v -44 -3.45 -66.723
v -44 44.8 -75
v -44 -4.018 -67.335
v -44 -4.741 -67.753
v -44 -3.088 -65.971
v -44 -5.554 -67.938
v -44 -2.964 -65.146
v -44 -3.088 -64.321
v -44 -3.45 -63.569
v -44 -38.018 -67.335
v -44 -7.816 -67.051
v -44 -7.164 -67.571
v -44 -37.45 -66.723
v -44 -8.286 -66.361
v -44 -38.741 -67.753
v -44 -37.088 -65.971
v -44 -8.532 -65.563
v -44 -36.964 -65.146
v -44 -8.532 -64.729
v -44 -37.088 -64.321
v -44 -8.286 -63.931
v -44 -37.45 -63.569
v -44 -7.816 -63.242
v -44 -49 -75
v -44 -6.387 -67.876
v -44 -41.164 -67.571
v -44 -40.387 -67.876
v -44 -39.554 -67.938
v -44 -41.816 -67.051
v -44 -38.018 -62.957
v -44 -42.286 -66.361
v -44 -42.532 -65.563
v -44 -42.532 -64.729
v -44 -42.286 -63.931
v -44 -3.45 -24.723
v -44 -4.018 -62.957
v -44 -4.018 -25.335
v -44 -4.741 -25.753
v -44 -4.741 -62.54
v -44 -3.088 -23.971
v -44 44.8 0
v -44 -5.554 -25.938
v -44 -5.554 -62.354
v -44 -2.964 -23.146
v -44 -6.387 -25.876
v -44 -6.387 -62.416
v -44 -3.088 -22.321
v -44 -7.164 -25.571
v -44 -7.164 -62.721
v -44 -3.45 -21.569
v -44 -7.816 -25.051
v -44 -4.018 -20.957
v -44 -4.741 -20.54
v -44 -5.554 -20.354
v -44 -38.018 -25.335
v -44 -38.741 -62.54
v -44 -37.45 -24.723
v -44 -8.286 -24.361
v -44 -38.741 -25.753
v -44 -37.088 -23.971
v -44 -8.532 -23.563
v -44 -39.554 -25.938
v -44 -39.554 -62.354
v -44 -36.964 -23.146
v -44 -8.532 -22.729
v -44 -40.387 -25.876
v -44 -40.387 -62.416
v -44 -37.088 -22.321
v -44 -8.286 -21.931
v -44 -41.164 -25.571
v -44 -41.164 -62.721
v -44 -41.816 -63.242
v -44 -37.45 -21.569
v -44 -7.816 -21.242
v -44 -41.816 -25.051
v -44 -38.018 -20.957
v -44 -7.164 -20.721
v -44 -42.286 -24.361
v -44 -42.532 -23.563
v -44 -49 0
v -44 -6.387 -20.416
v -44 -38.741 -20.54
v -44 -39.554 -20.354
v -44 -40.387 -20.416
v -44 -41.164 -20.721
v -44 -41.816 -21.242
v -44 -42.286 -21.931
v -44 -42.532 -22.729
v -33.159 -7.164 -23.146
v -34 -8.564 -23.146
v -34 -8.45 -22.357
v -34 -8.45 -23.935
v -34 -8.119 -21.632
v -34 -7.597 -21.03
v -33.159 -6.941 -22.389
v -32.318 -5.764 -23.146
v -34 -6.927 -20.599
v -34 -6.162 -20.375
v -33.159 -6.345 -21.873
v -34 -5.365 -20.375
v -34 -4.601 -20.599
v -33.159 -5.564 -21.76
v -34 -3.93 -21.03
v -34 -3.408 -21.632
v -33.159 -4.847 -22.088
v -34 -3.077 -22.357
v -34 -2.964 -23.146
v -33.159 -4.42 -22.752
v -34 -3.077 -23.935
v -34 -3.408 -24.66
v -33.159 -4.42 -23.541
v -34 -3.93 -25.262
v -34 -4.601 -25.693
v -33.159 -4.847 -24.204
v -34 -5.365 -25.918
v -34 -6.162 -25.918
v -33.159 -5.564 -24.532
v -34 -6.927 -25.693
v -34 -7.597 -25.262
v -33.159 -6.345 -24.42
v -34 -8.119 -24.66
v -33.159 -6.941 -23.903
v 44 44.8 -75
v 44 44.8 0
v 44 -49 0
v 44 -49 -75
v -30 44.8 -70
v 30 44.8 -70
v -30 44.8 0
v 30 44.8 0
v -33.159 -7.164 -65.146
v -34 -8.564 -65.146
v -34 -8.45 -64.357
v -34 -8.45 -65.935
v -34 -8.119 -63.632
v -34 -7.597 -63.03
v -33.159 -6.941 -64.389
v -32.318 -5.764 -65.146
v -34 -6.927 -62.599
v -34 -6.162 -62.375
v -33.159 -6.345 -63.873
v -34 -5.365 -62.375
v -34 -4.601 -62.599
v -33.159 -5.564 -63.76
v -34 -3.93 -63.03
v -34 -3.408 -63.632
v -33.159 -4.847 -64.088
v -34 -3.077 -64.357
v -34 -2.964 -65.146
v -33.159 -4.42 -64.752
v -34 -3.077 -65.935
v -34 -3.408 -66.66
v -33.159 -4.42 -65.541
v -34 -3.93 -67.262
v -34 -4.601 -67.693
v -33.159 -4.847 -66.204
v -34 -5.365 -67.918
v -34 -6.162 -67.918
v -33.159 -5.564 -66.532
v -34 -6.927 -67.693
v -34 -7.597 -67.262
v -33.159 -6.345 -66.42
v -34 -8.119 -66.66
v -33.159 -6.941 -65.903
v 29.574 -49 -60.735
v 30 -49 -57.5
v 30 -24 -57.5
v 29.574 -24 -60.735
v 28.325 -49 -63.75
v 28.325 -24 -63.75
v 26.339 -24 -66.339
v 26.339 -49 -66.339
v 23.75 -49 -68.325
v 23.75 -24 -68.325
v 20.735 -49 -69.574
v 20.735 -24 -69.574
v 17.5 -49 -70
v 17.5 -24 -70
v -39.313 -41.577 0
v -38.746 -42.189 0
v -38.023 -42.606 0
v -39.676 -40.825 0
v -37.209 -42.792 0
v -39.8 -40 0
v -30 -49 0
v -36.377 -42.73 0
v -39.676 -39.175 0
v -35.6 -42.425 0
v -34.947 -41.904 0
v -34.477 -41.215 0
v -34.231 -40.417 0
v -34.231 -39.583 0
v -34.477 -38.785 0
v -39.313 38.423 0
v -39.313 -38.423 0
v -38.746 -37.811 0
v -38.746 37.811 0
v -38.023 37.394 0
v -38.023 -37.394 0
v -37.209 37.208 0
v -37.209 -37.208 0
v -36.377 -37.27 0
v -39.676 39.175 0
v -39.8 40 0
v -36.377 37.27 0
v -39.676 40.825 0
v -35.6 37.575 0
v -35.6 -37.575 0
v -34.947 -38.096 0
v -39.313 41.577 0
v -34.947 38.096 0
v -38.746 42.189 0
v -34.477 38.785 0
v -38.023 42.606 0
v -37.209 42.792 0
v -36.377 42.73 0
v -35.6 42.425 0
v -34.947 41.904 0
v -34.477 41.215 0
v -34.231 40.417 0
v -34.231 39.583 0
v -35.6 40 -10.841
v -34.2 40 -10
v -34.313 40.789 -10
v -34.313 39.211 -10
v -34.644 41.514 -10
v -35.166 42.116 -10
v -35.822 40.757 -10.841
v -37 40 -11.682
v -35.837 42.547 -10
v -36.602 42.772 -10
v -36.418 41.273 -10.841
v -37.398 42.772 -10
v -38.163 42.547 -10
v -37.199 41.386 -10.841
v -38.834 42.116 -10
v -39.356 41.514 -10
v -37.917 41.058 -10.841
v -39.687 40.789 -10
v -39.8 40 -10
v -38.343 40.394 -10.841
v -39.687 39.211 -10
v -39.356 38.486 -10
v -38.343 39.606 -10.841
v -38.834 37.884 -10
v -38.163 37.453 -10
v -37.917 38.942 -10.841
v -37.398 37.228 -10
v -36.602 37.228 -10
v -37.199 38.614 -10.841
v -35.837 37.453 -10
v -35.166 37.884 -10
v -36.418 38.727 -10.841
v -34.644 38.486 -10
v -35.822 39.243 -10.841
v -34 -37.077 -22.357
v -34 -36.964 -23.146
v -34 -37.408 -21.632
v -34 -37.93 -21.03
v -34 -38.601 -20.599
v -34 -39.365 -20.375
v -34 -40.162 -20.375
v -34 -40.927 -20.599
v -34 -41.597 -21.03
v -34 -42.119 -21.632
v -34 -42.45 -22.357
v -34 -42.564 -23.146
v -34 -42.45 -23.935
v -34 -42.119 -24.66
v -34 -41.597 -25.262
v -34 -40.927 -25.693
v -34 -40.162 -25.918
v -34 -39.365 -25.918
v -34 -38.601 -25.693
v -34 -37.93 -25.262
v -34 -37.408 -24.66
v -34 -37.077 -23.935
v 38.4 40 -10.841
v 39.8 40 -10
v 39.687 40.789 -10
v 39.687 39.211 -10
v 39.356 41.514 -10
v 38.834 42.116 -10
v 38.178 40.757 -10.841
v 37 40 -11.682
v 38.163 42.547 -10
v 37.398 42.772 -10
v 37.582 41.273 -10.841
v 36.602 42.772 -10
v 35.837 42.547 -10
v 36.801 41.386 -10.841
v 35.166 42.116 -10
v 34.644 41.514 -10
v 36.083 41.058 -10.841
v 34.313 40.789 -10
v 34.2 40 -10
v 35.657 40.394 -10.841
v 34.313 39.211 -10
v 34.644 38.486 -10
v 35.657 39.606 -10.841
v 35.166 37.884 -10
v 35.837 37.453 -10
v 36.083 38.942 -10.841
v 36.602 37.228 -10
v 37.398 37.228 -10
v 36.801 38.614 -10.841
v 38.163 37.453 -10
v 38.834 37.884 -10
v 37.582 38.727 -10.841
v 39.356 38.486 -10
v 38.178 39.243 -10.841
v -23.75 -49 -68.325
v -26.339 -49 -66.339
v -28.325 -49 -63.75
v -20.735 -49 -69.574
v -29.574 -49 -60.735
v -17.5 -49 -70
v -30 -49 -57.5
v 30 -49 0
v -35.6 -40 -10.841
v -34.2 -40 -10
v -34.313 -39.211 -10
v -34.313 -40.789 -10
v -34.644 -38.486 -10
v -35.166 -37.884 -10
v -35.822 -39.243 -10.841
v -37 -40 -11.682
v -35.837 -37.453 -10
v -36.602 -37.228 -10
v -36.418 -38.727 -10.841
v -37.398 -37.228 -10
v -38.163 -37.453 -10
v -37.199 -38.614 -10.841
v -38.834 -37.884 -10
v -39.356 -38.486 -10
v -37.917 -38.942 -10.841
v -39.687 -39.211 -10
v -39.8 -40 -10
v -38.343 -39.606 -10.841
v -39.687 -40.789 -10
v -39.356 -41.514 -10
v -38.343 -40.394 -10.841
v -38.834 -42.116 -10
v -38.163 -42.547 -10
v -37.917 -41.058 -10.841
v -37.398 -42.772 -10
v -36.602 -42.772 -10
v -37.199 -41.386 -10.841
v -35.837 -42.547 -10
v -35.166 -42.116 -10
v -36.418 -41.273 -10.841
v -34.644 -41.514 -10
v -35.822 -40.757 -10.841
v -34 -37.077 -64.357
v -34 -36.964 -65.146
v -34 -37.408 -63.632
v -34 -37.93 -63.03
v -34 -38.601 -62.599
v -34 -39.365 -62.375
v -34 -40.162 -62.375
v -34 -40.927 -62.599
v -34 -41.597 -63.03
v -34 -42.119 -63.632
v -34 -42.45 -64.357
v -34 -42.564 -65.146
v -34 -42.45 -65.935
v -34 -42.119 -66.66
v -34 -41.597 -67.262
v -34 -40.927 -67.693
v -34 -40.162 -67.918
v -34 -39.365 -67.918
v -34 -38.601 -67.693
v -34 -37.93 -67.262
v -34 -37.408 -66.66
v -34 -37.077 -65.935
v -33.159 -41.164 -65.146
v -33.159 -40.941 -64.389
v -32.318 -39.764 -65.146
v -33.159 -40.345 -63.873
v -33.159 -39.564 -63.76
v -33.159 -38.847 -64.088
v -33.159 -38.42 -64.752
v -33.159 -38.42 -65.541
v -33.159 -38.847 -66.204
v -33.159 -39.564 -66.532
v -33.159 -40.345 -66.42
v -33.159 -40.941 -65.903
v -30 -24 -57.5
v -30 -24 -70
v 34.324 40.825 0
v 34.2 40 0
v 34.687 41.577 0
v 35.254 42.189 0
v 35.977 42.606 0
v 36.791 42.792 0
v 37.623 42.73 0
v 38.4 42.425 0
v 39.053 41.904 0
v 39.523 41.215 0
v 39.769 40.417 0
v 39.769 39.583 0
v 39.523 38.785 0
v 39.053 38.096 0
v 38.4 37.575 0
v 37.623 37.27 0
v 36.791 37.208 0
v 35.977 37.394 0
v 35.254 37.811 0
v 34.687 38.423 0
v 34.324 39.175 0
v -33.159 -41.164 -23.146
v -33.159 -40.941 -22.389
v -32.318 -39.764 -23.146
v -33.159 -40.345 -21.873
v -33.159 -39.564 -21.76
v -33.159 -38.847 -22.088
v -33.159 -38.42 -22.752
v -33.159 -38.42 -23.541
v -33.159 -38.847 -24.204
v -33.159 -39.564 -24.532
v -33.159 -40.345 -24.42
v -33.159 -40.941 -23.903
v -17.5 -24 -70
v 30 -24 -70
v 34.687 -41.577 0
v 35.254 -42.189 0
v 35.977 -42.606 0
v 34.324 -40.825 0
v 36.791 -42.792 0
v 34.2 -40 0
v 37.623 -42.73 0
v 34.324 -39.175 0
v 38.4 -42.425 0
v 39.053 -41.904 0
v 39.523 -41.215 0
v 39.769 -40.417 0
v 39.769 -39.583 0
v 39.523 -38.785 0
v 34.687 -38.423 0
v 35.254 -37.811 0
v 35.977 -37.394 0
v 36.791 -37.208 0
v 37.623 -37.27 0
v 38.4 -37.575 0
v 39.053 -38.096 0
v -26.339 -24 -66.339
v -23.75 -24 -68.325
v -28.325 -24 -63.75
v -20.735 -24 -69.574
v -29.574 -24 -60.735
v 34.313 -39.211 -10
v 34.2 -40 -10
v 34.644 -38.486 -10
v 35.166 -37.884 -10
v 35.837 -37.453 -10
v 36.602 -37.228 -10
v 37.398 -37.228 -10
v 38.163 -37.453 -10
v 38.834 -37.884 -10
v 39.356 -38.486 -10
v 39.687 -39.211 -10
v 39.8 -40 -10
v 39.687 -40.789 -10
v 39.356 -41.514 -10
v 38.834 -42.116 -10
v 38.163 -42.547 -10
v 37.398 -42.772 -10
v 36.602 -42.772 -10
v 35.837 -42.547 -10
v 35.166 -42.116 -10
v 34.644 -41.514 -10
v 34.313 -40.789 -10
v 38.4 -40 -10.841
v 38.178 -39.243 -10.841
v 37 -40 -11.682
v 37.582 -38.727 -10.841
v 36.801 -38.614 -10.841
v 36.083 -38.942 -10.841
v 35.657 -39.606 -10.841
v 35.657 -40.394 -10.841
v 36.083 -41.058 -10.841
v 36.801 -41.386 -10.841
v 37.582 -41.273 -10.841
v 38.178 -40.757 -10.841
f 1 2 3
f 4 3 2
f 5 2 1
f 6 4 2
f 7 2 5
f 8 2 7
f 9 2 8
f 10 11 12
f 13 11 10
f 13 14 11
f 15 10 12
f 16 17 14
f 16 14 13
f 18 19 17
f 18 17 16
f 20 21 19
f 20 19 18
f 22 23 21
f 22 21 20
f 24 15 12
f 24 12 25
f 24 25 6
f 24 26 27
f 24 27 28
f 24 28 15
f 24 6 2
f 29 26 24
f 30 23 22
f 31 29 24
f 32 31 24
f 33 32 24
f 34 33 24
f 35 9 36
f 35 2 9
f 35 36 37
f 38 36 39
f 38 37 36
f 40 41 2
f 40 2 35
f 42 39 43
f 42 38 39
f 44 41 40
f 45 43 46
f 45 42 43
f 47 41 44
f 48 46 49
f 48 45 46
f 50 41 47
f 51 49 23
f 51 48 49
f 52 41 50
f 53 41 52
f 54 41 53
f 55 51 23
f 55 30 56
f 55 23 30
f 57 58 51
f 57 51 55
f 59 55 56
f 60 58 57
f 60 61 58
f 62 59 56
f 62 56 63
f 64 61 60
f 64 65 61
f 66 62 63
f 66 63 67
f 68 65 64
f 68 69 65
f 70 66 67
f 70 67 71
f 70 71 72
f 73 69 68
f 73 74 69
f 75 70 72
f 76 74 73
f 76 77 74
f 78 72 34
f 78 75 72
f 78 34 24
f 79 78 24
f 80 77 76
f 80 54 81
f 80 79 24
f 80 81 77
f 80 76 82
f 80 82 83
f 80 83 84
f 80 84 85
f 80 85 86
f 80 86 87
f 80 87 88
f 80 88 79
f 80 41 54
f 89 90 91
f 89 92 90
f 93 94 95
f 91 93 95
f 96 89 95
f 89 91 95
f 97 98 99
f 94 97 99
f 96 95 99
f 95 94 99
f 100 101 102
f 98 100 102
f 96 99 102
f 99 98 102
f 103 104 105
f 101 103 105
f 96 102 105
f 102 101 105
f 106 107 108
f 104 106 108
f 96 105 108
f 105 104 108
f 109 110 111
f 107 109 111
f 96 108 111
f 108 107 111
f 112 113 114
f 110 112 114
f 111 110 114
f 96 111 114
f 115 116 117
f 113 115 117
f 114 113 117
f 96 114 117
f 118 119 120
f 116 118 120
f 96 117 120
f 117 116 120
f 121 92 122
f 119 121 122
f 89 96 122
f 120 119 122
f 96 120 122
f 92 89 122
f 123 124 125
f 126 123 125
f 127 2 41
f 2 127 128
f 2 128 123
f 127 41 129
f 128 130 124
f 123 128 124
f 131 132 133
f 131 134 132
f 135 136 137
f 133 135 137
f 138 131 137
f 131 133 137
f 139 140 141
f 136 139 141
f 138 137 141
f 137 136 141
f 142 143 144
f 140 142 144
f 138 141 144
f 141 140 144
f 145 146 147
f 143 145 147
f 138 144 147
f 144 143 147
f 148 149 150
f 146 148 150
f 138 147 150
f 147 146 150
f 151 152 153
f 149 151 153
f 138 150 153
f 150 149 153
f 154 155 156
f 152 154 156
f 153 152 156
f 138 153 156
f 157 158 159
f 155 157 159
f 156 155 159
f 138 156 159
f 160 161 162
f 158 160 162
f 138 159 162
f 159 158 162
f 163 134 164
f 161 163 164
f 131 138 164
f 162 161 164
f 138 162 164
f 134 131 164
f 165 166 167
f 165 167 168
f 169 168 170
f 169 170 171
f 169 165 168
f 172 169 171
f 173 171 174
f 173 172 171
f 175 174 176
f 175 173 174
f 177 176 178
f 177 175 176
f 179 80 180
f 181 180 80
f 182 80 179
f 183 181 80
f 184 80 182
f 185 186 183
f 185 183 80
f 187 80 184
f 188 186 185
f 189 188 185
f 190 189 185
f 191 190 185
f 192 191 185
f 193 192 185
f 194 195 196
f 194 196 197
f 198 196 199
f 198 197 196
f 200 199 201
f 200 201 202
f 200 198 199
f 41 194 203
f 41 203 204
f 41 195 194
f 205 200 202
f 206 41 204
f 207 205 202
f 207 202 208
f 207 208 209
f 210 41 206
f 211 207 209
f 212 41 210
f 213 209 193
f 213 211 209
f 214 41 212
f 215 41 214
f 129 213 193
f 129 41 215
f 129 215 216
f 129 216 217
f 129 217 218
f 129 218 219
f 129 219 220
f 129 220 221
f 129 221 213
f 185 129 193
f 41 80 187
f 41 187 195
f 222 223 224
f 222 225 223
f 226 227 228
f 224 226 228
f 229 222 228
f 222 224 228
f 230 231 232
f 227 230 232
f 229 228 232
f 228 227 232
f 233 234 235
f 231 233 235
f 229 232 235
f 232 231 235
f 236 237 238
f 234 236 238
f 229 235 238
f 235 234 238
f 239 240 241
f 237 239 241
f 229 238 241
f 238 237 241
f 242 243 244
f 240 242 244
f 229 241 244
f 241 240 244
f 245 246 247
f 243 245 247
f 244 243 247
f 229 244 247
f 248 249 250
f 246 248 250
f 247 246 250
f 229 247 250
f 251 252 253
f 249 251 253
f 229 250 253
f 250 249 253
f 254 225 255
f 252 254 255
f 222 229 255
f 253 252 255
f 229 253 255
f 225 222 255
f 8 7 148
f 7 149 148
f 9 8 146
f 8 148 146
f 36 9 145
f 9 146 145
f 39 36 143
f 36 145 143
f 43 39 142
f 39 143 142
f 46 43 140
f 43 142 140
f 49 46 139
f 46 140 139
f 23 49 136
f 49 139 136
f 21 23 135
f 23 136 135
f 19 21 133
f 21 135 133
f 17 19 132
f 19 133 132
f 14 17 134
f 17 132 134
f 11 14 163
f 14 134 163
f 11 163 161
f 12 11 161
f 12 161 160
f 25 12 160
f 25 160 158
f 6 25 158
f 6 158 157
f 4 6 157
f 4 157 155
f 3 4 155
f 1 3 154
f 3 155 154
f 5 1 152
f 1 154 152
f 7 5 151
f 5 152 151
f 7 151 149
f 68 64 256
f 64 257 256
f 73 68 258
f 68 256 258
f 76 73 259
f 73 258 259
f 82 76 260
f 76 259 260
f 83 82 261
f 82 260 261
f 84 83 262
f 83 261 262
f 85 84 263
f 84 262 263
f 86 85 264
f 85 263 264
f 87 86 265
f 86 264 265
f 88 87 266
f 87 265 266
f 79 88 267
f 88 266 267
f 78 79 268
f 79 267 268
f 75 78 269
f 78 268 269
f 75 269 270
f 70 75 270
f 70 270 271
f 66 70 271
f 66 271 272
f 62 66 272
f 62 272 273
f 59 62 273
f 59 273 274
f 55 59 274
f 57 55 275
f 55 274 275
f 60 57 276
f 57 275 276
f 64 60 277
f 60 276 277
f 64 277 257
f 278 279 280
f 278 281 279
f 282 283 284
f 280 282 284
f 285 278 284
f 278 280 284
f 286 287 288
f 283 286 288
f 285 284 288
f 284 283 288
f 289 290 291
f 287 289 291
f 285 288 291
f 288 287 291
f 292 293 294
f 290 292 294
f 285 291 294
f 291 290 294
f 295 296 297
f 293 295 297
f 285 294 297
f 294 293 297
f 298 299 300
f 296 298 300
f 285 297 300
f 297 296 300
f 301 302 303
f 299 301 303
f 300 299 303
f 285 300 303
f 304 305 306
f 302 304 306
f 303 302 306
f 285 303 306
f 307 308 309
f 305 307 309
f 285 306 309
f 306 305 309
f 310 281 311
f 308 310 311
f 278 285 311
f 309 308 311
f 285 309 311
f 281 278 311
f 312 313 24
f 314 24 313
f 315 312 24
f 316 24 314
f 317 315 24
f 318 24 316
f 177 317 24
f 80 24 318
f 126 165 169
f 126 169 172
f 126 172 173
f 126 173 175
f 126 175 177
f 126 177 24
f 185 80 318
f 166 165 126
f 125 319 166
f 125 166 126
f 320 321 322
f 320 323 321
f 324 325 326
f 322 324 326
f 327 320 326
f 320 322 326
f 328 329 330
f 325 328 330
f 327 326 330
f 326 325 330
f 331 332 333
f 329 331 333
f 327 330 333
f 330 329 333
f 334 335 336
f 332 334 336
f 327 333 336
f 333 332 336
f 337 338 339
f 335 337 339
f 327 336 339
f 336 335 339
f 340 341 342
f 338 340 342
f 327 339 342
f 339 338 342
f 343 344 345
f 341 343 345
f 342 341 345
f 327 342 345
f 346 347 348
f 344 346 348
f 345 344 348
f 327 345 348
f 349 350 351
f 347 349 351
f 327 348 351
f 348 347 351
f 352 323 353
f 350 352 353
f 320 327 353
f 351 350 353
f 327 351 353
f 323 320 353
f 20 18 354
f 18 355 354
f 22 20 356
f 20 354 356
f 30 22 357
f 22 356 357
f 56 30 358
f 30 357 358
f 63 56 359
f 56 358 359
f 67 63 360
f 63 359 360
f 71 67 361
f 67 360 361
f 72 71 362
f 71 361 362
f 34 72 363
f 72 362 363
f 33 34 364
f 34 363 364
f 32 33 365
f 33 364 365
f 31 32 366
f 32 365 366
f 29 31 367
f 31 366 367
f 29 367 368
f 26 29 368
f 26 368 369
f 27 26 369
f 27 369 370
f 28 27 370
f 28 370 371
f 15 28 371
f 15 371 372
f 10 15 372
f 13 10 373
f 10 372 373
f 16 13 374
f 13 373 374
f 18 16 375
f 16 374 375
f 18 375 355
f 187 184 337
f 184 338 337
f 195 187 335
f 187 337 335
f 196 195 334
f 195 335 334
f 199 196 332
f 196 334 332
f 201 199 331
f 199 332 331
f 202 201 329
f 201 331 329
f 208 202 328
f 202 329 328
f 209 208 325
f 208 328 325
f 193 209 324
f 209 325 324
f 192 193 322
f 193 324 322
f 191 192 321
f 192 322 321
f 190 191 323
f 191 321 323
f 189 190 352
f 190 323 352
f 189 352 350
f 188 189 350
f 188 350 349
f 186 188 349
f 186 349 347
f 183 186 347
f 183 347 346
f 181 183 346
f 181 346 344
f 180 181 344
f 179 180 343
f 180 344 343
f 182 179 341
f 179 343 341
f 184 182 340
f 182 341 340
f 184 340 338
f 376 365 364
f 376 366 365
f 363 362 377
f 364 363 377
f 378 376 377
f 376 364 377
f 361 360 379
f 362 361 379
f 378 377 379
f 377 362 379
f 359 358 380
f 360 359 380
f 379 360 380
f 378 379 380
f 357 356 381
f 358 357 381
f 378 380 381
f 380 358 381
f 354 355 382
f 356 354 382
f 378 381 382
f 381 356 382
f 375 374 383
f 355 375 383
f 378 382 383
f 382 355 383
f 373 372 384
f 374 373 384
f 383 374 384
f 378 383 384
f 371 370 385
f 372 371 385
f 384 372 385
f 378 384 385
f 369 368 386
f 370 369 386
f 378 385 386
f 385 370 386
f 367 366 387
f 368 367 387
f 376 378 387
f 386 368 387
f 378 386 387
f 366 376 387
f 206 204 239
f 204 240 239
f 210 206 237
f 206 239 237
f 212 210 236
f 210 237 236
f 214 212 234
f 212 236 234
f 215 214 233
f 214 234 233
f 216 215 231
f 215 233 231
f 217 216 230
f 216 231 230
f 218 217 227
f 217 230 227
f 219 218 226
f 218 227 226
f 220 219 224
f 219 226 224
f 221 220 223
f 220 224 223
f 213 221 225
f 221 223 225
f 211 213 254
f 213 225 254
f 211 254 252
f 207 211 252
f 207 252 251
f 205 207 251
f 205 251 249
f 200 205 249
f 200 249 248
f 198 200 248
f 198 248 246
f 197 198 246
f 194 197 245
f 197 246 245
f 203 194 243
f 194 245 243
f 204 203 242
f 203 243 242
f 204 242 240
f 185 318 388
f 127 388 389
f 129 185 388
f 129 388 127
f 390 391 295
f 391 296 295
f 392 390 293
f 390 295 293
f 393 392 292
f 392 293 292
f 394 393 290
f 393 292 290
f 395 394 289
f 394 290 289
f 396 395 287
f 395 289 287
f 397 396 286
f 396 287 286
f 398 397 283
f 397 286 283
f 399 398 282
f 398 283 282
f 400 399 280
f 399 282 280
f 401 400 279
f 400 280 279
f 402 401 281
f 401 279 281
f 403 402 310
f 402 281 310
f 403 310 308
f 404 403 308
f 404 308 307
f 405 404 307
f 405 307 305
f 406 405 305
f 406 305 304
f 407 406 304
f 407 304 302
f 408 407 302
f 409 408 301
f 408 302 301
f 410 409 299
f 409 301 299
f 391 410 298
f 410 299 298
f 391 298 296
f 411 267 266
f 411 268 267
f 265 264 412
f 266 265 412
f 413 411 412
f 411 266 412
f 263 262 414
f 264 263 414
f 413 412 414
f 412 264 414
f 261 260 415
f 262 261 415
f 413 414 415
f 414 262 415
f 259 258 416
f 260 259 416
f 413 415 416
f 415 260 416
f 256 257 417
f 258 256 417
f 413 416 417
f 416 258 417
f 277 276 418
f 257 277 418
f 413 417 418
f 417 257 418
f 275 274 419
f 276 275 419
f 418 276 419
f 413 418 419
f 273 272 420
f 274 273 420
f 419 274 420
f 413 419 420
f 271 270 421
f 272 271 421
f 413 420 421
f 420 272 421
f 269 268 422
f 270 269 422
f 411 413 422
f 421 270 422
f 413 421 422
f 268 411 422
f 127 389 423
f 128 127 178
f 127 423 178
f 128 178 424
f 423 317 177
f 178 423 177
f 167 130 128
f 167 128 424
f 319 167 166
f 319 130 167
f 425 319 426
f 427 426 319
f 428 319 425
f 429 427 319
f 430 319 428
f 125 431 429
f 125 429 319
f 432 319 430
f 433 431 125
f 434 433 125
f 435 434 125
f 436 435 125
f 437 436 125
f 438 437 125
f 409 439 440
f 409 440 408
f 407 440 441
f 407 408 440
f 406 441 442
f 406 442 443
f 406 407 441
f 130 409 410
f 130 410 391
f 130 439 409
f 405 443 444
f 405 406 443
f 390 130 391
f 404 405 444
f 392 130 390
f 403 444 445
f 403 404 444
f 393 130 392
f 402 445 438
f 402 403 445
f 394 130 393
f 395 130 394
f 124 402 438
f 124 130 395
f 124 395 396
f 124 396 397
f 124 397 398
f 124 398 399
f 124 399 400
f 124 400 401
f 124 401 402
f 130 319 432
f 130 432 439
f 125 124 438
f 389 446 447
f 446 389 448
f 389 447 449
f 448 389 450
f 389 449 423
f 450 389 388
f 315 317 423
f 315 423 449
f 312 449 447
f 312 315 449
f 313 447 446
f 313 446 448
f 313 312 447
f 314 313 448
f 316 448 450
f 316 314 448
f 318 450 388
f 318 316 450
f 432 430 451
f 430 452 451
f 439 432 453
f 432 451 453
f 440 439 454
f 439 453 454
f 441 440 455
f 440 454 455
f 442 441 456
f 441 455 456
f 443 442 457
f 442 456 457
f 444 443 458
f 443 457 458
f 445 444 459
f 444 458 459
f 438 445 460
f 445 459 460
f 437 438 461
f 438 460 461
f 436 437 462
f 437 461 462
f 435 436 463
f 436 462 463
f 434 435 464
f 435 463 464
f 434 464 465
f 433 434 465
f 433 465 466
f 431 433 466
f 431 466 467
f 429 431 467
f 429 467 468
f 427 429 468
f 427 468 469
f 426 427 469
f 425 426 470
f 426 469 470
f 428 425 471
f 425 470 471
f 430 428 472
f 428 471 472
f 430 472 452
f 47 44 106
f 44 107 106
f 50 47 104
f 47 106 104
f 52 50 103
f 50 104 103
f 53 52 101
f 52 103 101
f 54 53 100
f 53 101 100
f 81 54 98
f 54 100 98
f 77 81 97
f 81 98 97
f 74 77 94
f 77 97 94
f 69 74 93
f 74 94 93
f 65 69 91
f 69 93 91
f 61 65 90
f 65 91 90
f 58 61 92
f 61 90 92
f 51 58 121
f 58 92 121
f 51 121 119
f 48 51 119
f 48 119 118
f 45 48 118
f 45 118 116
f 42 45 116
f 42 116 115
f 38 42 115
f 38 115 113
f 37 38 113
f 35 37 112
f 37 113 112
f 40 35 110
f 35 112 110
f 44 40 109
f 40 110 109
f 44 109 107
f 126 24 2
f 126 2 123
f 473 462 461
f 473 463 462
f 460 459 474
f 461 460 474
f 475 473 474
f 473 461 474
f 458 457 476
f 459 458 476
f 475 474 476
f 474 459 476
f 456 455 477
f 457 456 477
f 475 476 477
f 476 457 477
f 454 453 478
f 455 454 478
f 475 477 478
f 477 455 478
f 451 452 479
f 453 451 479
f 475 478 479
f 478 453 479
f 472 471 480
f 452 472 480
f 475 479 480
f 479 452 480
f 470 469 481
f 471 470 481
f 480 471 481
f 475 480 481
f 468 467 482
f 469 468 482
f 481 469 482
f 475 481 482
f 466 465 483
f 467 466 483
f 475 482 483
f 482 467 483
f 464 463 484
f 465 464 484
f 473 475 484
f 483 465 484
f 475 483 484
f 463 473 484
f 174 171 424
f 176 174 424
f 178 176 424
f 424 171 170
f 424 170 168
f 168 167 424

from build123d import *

# Parameters (mm, degrees)
F0_W      = 60
F0_H      = 12.3176118359
F1_DEPTH  = 10
F2_DEPTH  = 60
F3_W      = 88
F3_H      = 98
F4_DEPTH  = 5
F5_DEPTH  = 70
F6_D      = 5.6
F6_DEPTH  = 10
F6_TIP    = 1.6824097333
F8_DEPTH  = 25
F9_W      = 88
F9_H      = 4.2
F10_DEPTH = 75.001
F12_D     = 5.6
F12_DEPTH = 10
F12_TIP   = 1.6824097333


with BuildPart() as f1:
    # F0 (on Top) → F1 (new body)
    with BuildSketch(Plane.XY):
        Polygon((-37, 40), (-30, 40), (-30, 49), (-44, 49), (-44, -49), (-30, -49), (-30, -40), (-37, -40), align=None)
        Polygon((-30, -6.1588059179), (-30, 6.1588059179), (-30, 40), (-37, 40), (-37, -40), (-30, -40), align=None)
        Rectangle(F0_W, F0_H)
        Polygon((37, -40), (37, 40), (30, 40), (30, 6.1588059179), (30, -6.1588059179), (30, -40), align=None)
        Polygon((30, 40), (37, 40), (37, -40), (30, -40), (30, -49), (44, -49), (44, 49), (30, 49), align=None)
    extrude(amount=-F1_DEPTH)

    # F2 (add): a face of the model
    f2_faces = [f1.faces().sort_by_distance(p)[0] for p in [
        (0, 0, -10),
    ]]
    extrude(f2_faces, amount=F2_DEPTH)

    # F3 (on face) → F4 (join)
    with BuildSketch(Plane(origin=(0, 0, -70), x_dir=(1, 0, 0), z_dir=(0, 0, -1))):
        Rectangle(F3_W, F3_H)
    extrude(amount=F4_DEPTH)

    # F0 (on Top) → F5 (cut, through all)
    with BuildSketch(Plane.XY):
        Rectangle(F0_W, F0_H)
    extrude(amount=-F5_DEPTH, mode=Mode.SUBTRACT)

    # F6
    with Locations(Plane.XY):
        with Locations((-37, 40), (-37, -40), (37, -40), (37, 40)):
            Hole(F6_D / 2, depth=F6_DEPTH)
            with Locations((0, 0, -(F6_DEPTH + F6_TIP / 2))):  # 118° drill point
                Cone(0, F6_D / 2, F6_TIP, mode=Mode.SUBTRACT)

    # F7 (on face) → F8 (join)
    with BuildSketch(Plane.XZ.offset(49)):
        with BuildLine():
            ThreePointArc((-17.500000122, -70), (-26.338834808, -66.3388347217), (-30, -57.5))
            Line((-30, -57.5), (-30, -70))
            Line((-30, -70), (-17.500000122, -70))
        make_face()
        with BuildLine():
            ThreePointArc((30, -57.5), (26.3388347648, -66.3388347648), (17.5, -70))
            Line((17.5, -70), (30, -70))
            Line((30, -70), (30, -57.5))
        make_face()
    extrude(amount=-F8_DEPTH)

    # F9 (on face) → F10 (cut, through all)
    with BuildSketch(Plane.XY):
        with Locations((0, 46.9)):
            Rectangle(F9_W, F9_H)
    extrude(amount=-F10_DEPTH, mode=Mode.SUBTRACT)

    # F12
    with Locations(Plane(origin=(-44, 0, 0), x_dir=(0, -1, 0), z_dir=(-1, 0, 0))):
        with Locations((5.7637224598, -23.1461717886), (39.7637224598, -23.1461717886), (5.7637224598, -65.1461717886), (39.7637224598, -65.1461717886)):
            Hole(F12_D / 2, depth=F12_DEPTH)
            with Locations((0, 0, -(F12_DEPTH + F12_TIP / 2))):  # 118° drill point
                Cone(0, F12_D / 2, F12_TIP, mode=Mode.SUBTRACT)


solid = f1.part
